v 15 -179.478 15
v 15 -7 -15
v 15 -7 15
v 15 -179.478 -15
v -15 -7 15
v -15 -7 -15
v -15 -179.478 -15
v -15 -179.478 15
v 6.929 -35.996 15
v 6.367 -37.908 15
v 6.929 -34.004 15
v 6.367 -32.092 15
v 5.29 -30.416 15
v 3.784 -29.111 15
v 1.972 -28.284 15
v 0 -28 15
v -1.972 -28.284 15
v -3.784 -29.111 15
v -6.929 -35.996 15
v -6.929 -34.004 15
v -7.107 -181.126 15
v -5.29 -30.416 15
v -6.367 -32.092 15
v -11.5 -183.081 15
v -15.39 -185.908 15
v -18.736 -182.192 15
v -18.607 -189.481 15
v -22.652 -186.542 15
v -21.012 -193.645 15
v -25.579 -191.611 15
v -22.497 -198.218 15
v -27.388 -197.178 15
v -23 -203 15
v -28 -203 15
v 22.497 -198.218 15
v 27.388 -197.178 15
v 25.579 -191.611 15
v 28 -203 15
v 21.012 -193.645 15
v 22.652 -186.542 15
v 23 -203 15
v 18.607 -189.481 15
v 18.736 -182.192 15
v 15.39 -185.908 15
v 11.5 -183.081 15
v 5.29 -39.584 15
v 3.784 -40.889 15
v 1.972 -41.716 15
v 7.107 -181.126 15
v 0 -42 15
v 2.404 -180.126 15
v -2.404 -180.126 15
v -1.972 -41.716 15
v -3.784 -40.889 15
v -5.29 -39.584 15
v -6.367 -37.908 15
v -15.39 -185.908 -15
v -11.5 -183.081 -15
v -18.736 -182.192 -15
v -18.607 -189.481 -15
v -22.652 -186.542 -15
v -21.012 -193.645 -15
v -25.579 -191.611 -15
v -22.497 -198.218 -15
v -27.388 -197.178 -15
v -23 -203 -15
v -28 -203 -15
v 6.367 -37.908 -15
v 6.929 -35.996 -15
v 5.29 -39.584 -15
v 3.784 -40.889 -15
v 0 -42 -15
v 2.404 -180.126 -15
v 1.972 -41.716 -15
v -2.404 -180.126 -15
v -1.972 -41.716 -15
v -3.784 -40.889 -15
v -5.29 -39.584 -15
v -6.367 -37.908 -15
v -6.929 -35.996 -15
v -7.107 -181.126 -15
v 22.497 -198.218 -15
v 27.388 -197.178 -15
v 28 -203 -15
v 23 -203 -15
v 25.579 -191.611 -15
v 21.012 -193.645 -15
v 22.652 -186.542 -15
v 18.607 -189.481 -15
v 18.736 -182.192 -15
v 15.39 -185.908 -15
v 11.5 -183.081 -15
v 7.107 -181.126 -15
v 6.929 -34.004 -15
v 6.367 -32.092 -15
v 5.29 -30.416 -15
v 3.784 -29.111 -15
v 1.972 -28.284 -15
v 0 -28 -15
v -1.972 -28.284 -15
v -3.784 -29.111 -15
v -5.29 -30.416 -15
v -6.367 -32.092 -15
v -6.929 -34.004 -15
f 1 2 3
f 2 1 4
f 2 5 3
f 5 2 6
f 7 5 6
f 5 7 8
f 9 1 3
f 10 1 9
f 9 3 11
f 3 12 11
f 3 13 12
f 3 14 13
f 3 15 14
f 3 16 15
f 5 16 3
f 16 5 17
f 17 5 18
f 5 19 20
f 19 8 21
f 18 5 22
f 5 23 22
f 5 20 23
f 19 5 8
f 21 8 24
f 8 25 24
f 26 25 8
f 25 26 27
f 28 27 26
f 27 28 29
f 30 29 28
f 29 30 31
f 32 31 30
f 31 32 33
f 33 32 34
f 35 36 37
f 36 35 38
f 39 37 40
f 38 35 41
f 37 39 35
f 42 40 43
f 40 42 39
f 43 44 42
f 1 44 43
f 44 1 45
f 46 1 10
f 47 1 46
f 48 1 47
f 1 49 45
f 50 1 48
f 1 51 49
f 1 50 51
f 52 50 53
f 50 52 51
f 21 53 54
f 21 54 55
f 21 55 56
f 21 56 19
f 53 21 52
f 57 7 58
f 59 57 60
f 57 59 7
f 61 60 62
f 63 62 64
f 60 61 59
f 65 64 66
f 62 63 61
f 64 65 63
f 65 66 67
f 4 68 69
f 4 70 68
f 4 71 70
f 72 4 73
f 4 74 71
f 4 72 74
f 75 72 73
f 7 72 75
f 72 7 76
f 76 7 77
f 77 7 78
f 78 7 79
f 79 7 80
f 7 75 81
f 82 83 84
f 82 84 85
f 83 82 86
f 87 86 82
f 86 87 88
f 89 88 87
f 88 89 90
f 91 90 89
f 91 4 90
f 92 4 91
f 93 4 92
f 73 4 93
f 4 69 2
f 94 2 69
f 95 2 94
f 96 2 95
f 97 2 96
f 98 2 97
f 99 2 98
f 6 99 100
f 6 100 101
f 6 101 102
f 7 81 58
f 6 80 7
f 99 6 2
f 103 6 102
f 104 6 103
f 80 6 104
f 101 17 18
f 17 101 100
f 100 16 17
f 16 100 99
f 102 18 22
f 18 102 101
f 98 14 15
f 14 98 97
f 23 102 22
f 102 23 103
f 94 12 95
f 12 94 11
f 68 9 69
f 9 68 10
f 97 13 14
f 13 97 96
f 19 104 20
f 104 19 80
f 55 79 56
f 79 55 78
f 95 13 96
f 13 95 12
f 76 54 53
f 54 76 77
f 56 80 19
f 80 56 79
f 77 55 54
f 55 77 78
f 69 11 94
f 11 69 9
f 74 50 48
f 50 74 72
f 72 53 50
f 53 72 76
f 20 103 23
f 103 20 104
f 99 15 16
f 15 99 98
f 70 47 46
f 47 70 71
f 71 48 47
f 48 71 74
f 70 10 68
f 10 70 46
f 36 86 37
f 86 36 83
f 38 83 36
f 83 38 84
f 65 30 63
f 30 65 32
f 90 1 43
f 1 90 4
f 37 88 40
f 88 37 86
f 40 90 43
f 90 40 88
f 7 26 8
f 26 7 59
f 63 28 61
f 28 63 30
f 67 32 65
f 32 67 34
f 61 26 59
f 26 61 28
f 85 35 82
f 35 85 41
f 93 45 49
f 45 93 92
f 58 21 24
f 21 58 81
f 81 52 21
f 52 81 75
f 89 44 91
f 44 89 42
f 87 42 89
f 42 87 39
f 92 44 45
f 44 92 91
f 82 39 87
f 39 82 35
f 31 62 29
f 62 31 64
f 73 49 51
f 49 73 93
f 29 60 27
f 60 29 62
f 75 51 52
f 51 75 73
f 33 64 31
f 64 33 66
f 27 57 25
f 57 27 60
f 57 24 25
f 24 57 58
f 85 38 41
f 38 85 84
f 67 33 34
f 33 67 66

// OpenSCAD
// file: holder.scad
module holder()
{
  cylinder(h=5, r=50);
  d=30+2*2;
  e=d+4;
  h=5+40;
  difference()
  {
    translate([-e/2, -e/2, 0])
      cube([e, e, h]);
    translate([-d/2, -d/2, 0])
      cube([d, d, h]);
    translate([-h/2, 0, h-10])
      rotate([0, 90, 0])
        cylinder(r=5+1, h=h);
  }
}

holder();
// main file
use <holder.scad>

h=180;
d=41+5;
r=50;

rotate([90, 0, 0])
{
  // bottom part - just for visualization
  %rotate([0, 0, 90])
    holder();

  // main rod
  difference()
  {
    translate([-15, -15, 5+2])
      cube([30, 30, h-5-2]);
    translate([0, -60/2, 35])
      rotate([0, 90, 90])
        cylinder(r=5+2, h=60);
  }

  // pipe holer's top part
  translate([0, 30/2, d/2+h])
    rotate([90, 0, 0])
    {
      difference()
      {
        cylinder(h=30, r=d/2+5);
        cylinder(h=30, r=d/2);
        translate([-30, 0, 0])
          cube([2*30, 30, 30]);
      }
    }
}
